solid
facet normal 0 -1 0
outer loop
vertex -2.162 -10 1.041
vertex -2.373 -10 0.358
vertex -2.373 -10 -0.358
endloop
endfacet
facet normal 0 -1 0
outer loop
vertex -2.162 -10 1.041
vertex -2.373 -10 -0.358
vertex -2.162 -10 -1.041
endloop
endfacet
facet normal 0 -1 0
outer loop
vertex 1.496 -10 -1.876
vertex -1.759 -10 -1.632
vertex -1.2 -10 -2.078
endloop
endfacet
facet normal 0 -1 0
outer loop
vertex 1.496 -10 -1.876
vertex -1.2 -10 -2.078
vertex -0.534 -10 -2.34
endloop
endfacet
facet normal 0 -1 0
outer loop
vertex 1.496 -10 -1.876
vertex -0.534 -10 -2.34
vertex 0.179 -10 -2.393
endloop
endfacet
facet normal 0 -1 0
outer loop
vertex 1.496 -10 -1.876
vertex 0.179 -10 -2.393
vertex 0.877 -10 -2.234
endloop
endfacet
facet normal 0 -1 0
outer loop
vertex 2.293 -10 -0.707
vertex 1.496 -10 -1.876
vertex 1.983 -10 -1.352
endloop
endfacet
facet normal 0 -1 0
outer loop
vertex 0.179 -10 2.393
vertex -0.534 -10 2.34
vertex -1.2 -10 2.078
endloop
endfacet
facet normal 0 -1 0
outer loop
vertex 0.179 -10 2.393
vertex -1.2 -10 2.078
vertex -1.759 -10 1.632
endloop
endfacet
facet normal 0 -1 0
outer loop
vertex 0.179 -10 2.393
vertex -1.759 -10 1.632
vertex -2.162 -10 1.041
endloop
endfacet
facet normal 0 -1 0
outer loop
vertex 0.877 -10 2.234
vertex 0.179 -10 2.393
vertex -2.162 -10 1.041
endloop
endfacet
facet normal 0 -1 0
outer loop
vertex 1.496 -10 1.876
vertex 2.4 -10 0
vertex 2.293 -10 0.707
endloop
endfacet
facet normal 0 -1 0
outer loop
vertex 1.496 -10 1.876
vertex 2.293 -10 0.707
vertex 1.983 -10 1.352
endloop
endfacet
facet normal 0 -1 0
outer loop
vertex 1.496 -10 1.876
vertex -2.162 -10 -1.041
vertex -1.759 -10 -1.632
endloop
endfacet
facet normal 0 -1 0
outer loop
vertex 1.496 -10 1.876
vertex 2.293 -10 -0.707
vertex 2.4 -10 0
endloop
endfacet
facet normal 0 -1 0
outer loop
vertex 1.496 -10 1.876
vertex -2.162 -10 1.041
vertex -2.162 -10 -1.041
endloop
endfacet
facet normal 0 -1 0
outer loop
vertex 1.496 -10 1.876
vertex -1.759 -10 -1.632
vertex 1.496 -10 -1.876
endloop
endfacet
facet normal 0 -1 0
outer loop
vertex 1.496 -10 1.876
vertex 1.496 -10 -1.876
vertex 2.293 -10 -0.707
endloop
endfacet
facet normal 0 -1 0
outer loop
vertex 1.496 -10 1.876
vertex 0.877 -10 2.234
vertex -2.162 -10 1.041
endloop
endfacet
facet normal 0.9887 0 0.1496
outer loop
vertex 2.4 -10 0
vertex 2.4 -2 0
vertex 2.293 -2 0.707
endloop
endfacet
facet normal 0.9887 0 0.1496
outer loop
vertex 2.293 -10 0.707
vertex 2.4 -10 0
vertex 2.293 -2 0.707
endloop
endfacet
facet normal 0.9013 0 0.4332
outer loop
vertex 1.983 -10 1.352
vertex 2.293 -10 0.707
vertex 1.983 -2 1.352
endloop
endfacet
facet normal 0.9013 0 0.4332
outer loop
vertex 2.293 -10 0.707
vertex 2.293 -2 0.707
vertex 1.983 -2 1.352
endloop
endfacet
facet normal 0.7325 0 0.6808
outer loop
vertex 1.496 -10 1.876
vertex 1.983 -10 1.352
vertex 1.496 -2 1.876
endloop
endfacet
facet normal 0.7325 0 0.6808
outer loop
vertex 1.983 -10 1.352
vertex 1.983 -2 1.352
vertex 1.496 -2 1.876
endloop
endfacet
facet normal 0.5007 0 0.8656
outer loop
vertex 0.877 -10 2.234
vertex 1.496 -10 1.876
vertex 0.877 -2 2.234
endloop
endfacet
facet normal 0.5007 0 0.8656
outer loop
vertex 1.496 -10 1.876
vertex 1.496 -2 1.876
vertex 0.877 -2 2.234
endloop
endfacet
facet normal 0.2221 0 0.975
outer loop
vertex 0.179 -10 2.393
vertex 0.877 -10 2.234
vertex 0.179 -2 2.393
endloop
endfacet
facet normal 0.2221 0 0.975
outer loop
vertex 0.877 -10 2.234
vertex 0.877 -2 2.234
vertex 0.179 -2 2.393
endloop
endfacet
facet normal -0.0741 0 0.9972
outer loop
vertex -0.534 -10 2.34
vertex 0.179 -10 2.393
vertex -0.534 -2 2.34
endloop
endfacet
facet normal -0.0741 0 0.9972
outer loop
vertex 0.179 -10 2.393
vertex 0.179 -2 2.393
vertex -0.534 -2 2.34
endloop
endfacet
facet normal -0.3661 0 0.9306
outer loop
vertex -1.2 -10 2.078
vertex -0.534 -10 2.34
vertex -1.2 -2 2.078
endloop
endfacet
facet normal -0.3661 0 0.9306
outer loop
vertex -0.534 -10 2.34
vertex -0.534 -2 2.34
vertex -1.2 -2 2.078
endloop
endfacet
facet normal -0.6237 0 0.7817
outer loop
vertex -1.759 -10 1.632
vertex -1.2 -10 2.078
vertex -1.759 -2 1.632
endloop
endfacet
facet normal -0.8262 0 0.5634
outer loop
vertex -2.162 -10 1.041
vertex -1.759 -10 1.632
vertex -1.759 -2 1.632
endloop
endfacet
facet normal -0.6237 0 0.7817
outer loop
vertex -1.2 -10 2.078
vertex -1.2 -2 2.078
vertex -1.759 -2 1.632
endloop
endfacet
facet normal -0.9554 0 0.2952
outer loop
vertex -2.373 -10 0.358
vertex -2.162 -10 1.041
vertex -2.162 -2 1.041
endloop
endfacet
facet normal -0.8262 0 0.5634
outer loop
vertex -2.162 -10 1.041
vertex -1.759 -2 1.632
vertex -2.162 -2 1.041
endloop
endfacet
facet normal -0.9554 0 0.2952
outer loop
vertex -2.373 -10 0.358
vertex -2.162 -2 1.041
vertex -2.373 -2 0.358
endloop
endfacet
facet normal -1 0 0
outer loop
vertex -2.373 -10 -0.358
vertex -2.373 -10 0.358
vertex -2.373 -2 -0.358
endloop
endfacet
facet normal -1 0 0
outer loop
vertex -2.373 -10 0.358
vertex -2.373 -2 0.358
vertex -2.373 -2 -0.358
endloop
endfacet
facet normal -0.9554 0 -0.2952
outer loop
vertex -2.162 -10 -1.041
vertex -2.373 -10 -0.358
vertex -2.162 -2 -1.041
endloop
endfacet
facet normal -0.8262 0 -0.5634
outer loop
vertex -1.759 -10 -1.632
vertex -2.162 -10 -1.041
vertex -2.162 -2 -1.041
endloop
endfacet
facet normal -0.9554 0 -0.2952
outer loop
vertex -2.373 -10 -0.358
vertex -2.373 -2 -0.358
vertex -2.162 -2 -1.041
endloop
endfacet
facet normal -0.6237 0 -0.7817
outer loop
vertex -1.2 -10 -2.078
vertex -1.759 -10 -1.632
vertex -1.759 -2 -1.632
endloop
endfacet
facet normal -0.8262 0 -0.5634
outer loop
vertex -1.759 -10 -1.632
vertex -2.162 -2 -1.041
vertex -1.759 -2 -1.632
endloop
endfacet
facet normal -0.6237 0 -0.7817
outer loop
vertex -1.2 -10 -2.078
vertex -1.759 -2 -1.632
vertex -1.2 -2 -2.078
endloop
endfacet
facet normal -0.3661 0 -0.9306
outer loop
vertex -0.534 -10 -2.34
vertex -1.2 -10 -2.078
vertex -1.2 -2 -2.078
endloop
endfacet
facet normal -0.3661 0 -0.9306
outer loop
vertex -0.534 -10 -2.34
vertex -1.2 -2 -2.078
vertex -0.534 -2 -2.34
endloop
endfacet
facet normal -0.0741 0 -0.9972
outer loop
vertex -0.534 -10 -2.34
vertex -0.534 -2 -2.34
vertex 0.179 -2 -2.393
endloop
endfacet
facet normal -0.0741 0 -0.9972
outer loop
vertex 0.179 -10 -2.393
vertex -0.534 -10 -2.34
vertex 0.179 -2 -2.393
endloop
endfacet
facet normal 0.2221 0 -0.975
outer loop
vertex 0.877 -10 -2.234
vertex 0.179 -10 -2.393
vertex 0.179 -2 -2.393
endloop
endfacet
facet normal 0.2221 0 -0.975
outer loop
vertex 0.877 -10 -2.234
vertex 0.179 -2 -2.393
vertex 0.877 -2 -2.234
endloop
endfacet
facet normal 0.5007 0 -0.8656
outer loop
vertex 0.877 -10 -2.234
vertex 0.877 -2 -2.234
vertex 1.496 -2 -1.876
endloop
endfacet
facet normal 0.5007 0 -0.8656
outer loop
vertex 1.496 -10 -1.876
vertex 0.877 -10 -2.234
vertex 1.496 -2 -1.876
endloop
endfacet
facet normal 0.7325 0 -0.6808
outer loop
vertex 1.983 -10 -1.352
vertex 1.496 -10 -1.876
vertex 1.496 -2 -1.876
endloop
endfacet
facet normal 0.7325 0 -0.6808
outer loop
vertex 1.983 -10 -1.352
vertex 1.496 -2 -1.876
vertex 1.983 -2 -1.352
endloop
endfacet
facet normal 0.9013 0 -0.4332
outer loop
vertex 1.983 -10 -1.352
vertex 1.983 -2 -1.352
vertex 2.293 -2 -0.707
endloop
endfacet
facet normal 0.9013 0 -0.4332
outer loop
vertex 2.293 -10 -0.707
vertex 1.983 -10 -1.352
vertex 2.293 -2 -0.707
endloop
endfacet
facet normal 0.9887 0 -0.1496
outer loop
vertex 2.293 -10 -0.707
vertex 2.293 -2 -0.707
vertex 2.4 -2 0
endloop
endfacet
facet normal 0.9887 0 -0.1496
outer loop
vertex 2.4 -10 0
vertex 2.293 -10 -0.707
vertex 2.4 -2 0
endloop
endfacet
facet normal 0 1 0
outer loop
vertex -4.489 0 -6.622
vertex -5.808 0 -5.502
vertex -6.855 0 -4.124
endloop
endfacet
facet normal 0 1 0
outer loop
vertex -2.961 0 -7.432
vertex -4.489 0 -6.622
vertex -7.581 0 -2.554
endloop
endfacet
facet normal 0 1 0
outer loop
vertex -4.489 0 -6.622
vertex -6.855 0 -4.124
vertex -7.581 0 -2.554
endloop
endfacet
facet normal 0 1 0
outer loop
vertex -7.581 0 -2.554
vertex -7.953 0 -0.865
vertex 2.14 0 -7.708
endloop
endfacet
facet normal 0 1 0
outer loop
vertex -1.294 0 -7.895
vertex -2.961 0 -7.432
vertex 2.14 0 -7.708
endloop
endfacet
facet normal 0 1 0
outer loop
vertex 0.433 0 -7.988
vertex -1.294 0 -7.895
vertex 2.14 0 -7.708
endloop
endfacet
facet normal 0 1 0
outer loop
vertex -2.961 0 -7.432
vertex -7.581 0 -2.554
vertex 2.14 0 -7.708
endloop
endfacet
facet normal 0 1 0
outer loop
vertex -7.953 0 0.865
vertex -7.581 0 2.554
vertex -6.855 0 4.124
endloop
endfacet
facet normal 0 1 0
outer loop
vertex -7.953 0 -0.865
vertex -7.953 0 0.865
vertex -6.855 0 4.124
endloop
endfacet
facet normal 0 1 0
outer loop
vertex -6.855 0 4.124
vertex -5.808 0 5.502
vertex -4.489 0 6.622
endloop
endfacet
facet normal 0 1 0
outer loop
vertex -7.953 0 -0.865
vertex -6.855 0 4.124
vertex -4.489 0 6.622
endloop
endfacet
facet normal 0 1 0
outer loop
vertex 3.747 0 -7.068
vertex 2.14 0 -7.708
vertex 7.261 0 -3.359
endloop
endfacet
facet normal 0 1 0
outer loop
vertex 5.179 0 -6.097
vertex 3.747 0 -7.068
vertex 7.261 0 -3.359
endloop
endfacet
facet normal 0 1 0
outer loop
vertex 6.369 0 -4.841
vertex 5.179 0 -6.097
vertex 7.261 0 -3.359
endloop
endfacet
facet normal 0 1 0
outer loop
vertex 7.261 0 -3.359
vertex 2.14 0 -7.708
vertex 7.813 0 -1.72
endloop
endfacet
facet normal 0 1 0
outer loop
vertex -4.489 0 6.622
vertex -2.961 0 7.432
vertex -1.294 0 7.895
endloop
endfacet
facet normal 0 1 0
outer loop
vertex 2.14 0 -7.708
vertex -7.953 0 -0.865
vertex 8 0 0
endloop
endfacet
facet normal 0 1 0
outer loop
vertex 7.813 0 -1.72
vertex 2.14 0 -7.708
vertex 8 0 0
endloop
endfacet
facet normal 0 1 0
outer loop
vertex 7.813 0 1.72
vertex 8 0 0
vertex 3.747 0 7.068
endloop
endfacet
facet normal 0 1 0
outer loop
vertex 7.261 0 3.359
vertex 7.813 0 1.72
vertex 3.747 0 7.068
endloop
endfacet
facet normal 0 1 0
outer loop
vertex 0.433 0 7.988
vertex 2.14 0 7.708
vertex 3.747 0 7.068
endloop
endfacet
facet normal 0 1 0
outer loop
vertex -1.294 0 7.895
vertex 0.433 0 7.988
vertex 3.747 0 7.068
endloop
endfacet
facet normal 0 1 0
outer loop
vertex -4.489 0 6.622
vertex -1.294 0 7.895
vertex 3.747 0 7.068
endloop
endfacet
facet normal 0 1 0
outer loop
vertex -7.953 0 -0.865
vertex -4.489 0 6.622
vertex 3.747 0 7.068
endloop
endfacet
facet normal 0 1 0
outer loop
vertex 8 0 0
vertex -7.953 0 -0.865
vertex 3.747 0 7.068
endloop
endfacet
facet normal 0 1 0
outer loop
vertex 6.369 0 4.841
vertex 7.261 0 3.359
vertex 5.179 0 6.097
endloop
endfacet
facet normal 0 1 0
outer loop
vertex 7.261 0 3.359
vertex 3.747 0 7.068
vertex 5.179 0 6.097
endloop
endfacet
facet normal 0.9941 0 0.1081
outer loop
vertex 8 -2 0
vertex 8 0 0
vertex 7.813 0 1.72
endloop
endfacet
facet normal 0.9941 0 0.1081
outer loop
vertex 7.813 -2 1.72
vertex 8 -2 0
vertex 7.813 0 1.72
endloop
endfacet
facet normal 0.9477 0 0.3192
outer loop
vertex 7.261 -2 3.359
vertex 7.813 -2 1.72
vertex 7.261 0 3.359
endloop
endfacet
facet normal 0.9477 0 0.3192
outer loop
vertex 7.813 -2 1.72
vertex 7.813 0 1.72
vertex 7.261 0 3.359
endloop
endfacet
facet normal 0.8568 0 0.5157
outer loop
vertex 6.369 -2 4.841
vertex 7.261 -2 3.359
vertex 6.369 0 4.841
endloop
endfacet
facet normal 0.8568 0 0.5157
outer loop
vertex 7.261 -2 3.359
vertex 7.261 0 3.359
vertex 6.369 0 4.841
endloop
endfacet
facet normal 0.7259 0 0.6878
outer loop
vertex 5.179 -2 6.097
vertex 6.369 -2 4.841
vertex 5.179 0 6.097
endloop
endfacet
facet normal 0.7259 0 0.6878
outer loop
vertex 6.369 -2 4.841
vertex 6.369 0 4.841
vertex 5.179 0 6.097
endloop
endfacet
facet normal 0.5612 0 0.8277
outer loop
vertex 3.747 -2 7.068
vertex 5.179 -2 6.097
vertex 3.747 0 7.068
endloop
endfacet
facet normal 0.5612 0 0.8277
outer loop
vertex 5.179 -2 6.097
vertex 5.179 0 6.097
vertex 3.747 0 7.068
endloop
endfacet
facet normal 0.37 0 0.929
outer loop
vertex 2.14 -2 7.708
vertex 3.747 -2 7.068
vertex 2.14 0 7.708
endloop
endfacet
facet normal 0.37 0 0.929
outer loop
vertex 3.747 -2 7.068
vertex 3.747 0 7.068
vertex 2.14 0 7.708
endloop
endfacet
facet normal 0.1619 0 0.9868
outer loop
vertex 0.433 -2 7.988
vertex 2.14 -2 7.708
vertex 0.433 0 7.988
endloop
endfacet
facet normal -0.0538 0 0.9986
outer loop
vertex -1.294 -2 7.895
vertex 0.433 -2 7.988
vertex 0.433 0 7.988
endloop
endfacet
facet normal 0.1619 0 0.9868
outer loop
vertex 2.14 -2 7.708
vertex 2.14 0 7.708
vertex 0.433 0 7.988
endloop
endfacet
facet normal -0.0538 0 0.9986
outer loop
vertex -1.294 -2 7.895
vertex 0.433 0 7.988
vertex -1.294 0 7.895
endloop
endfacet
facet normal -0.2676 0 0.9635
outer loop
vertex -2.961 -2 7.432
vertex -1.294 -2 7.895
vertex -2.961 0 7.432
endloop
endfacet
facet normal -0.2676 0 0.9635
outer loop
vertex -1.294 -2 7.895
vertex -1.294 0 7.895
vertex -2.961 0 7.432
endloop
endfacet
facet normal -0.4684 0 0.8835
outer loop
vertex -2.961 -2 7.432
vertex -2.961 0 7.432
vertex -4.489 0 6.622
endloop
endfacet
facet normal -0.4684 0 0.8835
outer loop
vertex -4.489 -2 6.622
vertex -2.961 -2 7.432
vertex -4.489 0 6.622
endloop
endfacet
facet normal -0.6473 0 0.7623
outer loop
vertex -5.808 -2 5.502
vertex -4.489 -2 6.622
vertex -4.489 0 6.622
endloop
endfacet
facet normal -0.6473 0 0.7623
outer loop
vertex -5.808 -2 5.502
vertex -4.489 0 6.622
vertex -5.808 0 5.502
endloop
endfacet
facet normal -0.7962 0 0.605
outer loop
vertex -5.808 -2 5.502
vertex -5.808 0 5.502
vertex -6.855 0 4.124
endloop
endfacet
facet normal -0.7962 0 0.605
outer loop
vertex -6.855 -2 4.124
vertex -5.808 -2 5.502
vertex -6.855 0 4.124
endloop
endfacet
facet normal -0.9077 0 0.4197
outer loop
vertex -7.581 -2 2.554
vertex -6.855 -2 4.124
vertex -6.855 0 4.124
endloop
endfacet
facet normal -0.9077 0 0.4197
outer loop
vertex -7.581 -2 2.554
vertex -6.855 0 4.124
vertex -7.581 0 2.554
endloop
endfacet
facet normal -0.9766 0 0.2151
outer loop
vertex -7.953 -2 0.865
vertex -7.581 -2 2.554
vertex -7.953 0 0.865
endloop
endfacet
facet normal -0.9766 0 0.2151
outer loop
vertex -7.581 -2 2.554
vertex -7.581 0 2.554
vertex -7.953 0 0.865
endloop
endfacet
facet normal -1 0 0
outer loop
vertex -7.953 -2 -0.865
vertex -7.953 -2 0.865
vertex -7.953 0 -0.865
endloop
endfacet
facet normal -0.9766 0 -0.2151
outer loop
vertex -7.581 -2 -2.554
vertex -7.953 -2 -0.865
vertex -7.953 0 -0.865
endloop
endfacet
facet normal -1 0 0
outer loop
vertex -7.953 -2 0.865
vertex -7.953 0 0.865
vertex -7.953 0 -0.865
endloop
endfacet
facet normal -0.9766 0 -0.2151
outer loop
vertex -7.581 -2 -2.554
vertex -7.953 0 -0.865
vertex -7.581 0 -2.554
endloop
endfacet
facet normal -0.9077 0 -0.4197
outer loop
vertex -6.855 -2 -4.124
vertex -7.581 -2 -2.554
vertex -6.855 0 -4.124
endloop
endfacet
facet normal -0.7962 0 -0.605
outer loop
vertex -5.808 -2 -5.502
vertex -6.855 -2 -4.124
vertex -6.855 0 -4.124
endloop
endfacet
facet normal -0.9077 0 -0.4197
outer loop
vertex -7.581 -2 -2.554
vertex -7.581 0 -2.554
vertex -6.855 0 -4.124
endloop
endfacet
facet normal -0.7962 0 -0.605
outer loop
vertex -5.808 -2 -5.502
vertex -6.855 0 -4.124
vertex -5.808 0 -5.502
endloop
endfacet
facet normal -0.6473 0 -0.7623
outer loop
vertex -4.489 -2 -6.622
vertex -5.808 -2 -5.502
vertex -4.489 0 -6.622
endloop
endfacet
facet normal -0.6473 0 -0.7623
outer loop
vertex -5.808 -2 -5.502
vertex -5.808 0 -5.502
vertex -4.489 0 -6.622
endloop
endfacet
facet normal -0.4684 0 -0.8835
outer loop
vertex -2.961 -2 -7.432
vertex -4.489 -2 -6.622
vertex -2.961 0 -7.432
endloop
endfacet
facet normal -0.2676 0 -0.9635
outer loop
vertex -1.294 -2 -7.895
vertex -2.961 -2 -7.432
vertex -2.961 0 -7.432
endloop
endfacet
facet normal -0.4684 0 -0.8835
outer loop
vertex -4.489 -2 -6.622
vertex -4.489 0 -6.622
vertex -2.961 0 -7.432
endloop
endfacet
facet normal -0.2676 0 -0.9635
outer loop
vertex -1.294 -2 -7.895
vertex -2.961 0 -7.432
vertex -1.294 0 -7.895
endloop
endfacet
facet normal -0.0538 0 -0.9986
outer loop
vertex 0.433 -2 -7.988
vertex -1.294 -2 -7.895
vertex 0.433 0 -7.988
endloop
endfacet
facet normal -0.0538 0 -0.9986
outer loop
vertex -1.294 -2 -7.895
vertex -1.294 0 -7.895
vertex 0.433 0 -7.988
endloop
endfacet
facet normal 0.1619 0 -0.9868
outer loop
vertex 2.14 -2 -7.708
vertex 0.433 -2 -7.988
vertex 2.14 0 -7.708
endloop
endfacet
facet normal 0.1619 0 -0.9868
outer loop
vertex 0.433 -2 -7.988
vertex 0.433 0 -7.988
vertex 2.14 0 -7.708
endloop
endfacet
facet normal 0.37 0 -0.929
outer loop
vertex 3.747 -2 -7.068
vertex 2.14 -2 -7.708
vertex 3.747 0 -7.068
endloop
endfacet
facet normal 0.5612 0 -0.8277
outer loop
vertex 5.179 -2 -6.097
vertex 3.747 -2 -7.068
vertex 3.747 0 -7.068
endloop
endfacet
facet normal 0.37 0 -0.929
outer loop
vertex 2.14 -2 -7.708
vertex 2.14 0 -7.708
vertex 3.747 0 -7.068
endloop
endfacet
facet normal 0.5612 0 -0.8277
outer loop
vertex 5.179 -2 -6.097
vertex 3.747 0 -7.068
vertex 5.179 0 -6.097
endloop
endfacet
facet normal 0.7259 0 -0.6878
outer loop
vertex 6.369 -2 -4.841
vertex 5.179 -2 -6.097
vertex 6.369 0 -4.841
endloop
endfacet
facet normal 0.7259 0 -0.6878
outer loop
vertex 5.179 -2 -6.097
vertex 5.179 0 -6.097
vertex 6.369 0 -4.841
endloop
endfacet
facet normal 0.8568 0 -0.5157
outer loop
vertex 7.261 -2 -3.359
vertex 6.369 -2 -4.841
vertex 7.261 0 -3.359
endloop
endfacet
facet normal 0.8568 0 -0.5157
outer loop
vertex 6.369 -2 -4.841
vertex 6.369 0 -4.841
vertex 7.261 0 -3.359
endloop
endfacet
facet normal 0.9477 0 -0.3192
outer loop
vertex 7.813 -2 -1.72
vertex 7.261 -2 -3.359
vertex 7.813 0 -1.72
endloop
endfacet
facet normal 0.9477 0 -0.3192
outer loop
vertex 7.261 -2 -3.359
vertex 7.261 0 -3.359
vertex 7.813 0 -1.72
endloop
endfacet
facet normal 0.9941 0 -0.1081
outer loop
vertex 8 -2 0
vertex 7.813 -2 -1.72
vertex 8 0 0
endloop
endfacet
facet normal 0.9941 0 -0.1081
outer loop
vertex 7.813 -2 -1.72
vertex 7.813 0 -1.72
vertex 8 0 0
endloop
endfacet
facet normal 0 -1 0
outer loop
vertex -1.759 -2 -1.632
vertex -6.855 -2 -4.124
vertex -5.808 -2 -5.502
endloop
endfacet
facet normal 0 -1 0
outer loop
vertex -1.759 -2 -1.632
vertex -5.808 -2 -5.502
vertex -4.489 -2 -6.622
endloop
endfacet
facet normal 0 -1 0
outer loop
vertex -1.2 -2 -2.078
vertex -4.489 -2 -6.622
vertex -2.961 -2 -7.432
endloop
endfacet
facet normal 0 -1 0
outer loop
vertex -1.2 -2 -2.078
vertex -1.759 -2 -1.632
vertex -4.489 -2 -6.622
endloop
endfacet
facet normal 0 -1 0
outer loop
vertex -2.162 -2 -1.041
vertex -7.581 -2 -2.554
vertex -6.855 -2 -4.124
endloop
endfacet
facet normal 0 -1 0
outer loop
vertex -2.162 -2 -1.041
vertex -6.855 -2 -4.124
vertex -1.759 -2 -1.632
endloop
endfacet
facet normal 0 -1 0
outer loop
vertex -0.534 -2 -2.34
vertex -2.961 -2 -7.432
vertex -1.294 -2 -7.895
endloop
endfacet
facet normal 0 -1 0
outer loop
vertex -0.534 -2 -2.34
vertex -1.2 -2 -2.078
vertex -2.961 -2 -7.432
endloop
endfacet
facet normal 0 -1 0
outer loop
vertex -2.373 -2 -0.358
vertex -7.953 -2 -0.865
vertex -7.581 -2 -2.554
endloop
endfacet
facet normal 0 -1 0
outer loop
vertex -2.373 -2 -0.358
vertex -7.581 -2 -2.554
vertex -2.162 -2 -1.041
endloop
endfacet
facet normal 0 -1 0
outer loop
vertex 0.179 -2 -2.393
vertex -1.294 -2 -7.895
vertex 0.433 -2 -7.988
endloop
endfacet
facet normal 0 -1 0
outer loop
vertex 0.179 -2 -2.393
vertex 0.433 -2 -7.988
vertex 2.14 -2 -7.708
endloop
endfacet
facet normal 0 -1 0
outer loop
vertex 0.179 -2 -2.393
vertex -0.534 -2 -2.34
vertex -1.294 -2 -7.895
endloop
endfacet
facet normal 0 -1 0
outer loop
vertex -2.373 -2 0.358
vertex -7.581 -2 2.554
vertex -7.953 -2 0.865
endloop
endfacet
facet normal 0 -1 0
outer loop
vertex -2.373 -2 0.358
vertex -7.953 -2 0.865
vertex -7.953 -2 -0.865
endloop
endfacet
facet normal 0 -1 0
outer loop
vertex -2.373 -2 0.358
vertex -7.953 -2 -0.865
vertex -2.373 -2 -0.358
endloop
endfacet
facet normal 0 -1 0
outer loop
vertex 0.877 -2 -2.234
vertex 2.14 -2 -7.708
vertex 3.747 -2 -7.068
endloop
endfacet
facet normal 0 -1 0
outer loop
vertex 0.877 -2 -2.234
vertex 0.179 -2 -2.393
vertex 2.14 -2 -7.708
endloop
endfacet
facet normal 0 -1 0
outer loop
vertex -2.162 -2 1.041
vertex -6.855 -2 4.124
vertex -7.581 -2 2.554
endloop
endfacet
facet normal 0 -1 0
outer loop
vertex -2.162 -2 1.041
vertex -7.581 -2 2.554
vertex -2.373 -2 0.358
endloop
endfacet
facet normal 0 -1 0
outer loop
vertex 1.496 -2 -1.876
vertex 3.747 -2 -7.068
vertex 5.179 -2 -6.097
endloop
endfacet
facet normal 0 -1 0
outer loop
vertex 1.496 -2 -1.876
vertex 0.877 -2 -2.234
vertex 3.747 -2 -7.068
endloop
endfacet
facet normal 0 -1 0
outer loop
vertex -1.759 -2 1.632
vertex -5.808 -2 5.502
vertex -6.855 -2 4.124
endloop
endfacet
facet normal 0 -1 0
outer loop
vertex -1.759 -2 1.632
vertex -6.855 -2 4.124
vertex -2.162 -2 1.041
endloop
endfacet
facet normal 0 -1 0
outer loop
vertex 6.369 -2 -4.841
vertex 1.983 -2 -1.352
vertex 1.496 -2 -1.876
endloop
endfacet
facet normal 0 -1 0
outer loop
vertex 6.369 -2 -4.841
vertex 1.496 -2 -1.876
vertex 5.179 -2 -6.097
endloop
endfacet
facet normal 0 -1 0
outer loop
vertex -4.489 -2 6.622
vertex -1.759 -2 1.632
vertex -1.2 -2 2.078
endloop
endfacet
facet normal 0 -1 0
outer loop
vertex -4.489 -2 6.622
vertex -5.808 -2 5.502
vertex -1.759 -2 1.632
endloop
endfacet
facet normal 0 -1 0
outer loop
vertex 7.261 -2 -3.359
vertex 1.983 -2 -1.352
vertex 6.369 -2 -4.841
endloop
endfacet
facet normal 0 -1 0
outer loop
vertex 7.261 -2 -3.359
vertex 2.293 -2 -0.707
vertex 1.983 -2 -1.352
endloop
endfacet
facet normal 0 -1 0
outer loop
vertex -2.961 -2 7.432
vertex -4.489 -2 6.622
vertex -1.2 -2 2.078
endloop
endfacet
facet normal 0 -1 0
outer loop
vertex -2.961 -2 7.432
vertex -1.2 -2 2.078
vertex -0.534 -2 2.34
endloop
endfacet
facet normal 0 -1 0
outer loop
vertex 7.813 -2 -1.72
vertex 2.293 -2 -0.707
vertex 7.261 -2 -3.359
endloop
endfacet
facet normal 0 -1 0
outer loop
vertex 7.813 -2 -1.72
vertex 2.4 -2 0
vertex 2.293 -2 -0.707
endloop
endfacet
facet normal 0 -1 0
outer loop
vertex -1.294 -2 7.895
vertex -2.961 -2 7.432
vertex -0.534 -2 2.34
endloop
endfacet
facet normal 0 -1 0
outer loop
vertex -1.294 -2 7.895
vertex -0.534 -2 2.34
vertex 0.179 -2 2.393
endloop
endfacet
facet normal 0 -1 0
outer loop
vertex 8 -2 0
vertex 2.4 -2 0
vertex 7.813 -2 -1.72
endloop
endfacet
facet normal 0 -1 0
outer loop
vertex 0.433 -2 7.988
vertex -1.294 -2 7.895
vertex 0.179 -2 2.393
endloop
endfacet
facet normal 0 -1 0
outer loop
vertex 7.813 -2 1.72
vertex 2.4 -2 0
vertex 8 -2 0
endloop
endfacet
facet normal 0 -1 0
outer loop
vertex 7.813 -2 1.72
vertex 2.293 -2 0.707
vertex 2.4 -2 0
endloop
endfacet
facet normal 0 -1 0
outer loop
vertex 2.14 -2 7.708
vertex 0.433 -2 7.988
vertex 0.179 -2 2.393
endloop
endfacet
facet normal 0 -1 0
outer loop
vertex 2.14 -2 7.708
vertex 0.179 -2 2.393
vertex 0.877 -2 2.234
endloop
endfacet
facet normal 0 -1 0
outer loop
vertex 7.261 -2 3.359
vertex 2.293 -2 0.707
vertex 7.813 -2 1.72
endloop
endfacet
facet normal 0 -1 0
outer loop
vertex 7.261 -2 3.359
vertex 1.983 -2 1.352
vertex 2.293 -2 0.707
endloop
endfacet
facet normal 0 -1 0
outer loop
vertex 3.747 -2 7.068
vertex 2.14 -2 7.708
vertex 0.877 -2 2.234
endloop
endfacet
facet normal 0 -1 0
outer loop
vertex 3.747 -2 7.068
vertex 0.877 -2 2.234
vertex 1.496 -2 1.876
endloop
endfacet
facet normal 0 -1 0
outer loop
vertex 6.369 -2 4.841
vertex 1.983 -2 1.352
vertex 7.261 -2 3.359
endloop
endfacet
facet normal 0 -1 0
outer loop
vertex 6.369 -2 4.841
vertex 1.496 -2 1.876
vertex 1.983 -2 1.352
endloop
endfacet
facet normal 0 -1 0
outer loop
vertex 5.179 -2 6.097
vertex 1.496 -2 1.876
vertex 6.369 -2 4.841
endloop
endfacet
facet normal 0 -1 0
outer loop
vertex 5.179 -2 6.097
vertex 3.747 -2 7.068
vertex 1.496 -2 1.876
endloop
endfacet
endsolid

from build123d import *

# Parameters (mm, degrees)
CYLINDER_R             = 2.4
CYLINDER_DEPTH         = 10
CYLINDER_ROLL_ANGLE    = 90
CYLINDER001_R          = 8
CYLINDER001_DEPTH      = 2
CYLINDER001_ROLL_ANGLE = 90


with BuildPart() as pivotstick:
    # Cylinder → Cylinder (new body)
    with BuildSketch(Plane.XY):
        Circle(CYLINDER_R)
    extrude(amount=CYLINDER_DEPTH)


with BuildPart() as pivotstick_1:
    # Cylinder roll: moved
    add(pivotstick.part.rotate(Axis((0, 0, 0), (1, 0, 0)), CYLINDER_ROLL_ANGLE))


with BuildPart() as pivotstick_2:
    # Cylinder placement: moved
    add(pivotstick_1.part)


with BuildPart() as pivot:
    # Cylinder001 → Cylinder001 (new body)
    with BuildSketch(Plane.XY):
        Circle(CYLINDER001_R)
    extrude(amount=CYLINDER001_DEPTH)


with BuildPart() as pivot_1:
    # Cylinder001 roll: moved
    add(pivot.part.rotate(Axis((0, 0, 0), (1, 0, 0)), CYLINDER001_ROLL_ANGLE))


with BuildPart() as pivot_2:
    # Cylinder001 placement: moved
    add(pivot_1.part)

    # Fusion002: union PivotStick
    add(pivotstick_2.part)


solid = pivot_2.part
